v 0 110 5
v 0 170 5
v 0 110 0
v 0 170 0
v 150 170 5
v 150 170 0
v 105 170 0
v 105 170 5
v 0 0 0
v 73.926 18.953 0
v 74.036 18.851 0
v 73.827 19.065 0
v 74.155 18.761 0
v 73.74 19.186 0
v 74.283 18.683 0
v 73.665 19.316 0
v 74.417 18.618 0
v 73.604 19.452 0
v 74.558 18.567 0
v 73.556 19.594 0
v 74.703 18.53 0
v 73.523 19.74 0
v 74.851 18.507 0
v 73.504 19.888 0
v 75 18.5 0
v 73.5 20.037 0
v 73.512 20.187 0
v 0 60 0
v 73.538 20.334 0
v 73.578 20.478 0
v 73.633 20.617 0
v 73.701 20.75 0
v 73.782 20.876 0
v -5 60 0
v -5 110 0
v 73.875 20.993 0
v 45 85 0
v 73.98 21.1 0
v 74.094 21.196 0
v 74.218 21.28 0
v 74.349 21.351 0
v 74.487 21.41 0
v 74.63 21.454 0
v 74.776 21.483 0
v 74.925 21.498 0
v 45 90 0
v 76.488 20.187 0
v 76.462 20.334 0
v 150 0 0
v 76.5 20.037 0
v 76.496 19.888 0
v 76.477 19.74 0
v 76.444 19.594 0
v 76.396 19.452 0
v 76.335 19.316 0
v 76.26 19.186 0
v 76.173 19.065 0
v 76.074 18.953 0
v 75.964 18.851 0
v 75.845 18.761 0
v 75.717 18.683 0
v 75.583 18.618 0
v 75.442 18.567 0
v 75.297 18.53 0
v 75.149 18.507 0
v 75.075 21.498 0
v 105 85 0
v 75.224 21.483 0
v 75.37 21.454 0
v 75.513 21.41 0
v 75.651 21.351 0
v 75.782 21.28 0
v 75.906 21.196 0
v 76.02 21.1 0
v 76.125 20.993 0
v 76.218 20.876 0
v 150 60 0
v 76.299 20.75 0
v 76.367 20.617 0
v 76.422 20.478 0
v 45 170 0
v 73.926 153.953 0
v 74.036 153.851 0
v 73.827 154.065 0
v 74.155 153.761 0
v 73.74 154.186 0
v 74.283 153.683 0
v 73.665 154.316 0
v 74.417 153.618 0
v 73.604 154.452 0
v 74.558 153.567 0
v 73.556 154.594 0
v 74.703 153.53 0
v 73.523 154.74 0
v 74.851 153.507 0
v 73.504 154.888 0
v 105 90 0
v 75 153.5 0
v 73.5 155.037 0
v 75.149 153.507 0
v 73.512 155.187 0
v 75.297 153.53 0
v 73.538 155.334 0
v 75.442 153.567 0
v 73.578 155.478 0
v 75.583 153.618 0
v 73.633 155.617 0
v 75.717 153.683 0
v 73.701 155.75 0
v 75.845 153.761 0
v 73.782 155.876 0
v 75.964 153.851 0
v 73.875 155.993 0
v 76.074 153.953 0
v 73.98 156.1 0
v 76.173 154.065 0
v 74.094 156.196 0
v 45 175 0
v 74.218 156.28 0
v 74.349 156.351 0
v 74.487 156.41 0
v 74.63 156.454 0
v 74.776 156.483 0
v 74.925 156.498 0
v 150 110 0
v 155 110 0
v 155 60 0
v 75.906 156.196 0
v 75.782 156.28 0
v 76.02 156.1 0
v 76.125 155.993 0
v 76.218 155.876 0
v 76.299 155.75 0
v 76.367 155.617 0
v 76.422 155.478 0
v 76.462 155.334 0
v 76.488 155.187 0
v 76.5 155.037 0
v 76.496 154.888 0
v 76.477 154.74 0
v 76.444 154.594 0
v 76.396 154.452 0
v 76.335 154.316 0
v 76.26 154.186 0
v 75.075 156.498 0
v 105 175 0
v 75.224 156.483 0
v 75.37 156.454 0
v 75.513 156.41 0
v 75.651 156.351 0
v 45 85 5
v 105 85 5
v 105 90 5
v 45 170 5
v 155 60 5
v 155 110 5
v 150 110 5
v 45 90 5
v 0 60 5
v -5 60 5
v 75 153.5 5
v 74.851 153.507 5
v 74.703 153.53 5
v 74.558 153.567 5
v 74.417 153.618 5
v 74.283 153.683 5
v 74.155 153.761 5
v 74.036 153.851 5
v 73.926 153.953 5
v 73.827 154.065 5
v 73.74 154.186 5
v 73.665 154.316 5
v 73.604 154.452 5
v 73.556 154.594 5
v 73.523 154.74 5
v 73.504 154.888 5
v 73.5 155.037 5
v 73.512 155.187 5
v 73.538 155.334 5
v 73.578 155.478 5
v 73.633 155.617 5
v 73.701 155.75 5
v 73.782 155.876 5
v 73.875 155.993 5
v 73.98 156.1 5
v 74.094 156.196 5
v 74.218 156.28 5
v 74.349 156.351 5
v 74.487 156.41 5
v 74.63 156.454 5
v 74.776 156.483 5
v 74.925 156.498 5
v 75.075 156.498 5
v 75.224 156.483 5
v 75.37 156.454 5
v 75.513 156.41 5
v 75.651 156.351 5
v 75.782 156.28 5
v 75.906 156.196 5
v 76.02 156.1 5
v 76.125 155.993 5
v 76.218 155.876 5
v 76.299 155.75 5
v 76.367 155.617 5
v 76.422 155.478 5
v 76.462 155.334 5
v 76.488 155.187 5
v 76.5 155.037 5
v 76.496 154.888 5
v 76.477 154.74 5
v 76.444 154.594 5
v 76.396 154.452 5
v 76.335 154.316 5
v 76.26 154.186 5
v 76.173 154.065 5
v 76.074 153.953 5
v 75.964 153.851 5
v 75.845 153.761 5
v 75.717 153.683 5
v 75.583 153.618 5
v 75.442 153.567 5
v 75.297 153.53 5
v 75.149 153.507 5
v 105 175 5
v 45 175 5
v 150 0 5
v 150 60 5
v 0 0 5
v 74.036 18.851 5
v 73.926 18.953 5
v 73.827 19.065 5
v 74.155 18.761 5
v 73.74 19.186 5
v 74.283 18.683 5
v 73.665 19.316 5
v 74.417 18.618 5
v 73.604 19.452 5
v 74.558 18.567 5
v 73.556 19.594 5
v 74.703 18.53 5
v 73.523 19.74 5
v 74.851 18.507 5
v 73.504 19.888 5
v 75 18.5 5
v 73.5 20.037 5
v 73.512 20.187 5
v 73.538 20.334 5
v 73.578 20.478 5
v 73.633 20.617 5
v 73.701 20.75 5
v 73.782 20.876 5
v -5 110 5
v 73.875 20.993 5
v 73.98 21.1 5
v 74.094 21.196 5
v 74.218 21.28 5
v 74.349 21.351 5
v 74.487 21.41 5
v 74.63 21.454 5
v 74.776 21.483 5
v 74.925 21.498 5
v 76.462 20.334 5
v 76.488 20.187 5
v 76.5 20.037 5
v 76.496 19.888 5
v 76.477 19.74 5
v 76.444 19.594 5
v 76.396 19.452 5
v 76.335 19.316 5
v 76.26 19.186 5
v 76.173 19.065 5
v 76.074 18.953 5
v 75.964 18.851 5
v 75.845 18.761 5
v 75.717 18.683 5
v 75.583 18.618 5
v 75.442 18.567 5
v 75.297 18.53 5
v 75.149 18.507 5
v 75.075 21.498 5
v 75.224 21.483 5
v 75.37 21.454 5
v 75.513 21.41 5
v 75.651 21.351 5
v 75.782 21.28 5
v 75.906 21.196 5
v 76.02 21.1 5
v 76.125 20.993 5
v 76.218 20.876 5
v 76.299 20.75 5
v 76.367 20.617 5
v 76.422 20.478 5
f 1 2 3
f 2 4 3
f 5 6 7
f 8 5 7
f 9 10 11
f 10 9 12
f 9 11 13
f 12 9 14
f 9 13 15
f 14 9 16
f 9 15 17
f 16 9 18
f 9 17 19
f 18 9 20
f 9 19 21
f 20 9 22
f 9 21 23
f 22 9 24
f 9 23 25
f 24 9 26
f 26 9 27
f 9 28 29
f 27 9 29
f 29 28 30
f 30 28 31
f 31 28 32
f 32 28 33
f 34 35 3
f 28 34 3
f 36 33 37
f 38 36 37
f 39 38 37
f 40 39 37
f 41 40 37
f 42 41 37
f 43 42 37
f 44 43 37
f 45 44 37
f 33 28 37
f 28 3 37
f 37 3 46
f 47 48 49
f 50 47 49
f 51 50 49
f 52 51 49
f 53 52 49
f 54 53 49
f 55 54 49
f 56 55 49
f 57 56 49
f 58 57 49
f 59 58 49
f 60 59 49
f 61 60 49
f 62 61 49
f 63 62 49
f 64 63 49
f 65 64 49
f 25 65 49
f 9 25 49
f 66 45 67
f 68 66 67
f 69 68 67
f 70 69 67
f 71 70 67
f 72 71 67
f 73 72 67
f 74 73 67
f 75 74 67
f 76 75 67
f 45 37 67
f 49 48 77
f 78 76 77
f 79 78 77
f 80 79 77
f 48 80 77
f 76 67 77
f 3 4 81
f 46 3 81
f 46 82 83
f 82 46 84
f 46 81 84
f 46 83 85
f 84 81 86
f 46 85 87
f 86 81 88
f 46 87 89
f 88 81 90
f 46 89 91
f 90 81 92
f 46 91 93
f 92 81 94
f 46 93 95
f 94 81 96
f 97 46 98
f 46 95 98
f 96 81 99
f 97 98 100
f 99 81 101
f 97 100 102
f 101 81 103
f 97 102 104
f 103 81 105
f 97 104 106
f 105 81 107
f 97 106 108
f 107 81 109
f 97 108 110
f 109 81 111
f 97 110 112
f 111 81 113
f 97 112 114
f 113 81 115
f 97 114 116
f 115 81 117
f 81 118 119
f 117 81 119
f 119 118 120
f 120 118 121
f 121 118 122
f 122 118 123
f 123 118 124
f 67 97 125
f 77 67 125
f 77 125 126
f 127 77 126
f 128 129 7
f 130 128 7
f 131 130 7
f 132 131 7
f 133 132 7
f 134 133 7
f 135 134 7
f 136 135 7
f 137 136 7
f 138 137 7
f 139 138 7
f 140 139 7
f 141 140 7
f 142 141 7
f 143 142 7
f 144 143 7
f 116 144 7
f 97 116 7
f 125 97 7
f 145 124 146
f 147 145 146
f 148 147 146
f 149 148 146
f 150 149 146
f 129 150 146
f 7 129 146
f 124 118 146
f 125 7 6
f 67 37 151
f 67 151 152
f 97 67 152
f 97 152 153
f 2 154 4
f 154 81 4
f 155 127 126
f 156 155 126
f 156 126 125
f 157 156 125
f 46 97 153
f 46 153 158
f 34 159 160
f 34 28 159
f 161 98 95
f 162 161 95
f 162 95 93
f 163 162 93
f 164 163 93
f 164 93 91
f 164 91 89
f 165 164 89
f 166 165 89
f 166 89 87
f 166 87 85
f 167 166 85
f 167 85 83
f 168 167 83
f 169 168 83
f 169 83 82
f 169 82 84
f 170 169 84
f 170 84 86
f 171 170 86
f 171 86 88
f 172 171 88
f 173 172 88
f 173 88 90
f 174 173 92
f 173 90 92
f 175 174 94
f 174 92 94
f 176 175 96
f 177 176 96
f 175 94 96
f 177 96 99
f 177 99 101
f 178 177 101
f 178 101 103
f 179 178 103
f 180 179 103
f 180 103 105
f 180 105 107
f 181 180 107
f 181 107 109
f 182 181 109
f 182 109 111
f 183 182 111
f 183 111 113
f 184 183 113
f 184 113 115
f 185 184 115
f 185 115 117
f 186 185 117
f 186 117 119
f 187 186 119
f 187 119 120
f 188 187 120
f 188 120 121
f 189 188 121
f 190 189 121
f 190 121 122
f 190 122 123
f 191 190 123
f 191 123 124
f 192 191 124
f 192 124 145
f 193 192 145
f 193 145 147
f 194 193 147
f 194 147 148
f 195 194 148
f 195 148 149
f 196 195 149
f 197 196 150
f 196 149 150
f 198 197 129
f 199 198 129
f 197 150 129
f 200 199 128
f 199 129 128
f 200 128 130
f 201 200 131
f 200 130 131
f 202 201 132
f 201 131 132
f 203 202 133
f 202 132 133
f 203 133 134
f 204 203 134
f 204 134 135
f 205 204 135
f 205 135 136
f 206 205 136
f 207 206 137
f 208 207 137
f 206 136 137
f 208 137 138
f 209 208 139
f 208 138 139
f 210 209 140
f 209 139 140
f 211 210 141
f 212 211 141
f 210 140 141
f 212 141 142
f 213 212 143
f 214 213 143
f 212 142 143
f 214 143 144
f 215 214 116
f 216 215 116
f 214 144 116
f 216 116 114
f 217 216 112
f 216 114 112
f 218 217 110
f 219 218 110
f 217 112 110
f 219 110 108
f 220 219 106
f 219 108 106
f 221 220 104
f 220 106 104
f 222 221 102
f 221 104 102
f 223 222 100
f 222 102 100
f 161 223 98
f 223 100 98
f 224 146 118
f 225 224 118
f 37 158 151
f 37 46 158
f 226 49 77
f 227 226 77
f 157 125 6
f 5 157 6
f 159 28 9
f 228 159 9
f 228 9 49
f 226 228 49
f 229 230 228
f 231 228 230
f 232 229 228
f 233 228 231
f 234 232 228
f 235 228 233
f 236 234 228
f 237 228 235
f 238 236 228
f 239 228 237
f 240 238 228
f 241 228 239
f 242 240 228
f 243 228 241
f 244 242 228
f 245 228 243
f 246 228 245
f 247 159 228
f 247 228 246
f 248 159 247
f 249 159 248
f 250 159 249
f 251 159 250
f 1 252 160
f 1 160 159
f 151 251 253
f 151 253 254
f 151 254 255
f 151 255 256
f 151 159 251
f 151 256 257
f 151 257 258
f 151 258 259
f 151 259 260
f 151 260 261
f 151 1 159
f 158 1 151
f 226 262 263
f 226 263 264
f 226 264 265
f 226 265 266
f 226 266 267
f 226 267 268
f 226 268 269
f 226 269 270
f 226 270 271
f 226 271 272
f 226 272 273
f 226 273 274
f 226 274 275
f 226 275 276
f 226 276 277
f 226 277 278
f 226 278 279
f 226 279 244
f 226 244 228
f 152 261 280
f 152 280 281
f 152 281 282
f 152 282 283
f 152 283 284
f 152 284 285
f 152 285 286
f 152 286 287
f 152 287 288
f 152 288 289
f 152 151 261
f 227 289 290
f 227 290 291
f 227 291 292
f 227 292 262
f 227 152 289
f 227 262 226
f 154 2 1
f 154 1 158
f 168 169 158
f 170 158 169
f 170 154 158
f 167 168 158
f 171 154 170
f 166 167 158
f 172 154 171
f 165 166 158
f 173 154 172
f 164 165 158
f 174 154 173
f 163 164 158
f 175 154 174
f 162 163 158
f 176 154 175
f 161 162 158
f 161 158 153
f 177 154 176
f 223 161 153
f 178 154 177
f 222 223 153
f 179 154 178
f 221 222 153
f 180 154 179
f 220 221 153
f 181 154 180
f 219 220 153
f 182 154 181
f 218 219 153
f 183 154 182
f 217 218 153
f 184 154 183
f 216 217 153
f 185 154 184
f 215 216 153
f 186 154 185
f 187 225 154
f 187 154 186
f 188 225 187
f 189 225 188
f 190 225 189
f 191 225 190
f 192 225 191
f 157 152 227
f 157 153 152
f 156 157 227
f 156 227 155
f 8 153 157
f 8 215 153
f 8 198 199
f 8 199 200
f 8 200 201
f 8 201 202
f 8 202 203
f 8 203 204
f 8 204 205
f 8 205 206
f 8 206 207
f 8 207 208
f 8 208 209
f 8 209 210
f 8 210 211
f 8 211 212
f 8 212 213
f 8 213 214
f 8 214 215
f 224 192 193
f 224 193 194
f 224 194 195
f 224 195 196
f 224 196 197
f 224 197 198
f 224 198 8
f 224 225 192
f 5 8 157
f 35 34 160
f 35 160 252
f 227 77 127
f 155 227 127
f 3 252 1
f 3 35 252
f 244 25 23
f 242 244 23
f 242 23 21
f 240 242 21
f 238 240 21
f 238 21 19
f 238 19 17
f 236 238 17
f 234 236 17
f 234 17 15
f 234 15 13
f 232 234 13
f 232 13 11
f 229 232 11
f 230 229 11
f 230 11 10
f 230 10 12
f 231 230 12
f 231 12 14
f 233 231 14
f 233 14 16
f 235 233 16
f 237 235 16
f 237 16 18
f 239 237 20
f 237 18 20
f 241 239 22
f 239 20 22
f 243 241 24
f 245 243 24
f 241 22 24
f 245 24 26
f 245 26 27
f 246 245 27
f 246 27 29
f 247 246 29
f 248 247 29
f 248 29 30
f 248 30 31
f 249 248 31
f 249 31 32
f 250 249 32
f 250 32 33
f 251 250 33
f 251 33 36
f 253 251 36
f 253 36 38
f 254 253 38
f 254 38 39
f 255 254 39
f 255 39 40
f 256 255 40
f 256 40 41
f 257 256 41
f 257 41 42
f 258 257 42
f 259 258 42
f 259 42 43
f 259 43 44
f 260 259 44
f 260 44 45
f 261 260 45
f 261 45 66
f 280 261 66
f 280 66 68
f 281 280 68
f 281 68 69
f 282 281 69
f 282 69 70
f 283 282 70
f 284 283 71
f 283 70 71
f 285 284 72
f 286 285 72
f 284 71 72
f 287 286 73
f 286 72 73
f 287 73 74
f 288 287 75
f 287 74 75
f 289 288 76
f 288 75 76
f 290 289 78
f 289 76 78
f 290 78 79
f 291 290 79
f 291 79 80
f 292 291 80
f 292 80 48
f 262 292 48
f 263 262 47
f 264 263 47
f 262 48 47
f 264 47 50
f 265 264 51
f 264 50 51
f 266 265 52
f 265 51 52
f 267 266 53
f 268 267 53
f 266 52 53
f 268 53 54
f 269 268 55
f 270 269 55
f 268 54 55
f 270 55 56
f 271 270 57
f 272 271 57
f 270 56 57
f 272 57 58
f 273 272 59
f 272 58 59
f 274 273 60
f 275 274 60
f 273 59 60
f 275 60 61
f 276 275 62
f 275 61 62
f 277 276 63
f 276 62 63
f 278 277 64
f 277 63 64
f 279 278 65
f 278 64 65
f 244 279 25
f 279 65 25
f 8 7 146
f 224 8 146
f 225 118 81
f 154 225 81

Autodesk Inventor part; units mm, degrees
ref_plane "YZ Plane" through (0, 0, 0) normal (1, 0, 0) x (0, 1, 0)
ref_plane "XZ Plane" through (0, 0, 0) normal (0, 1, 0) x (-1, 0, 0)
ref_plane "XY Plane" through (0, 0, 0) normal (0, 0, 1) x (1, 0, 0)
sketch "Sketch1" plane through (0, 0, 0) normal (0, 0, 1) x (1, 0, 0)
  line L0 (0, 0) -> (150, 0)
  line L1 (150, 0) -> (150, 170)
  line L2 (150, 170) -> (0, 170)
  line L3 (0, 170) -> (0, 0)
  line L4 (0, 60) -> (-5, 60)
  line L5 (-5, 60) -> (-5, 110)
  line L6 (-5, 110) -> (0, 110)
  line L7 (0, 110) -> (0, 60)
  line L8 (75, 0) -> (75, 170) construction
  line L9 (150, 60) -> (155, 60)
  line L10 (155, 60) -> (155, 110)
  line L11 (155, 110) -> (150, 110)
  line L12 (150, 110) -> (150, 60)
  line L13 (45, 85) -> (105, 85)
  line L14 (105, 85) -> (105, 90)
  line L15 (105, 90) -> (45, 90)
  line L16 (45, 90) -> (45, 85)
  line L17 (0, 85) -> (150, 85) construction
  line L18 (45, 170) -> (105, 170)
  line L19 (105, 170) -> (105, 175)
  line L20 (105, 175) -> (45, 175)
  line L21 (45, 175) -> (45, 170)
  point P0 (0, 110)
  point P1 (10, 0)
  point P2 (45, 87.5)
  dimension "d0" = 150
  dimension "d1" = 170
  dimension "d2" = 5
  dimension "d3" = 50
  dimension "d6" = 60
  dimension "d7" = 5
  dimension "d13" = 80
  dimension "d14" = 30
  dimension "d30" = 60
  dimension "d31" = 5
  dimension "d32" = 45
  dimension "d44" = 60
extrude "Extrusion1" add sketch "Sketch1" along normal blind 5
sketch "Sketch2" plane through (0, 0, 5) normal (0, 0, 1) x (1, 0, 0)
  line L0 (150, 170) -> (0, 170) projected
  line L1 (0, 0) -> (150, 0) projected
  line L2 (0, 170) -> (0, 110) projected
  line L3 (0, 60) -> (0, 0) projected
  point P0 (75, 20)
  dimension "d24" = 20
  dimension "d29" = 75
hole "Hole1" at (75, 20, 5) direction (0, 0, -1) diameter 3 end through all
sketch "Sketch3" plane through (0, 0, 5) normal (0, 0, 1) x (1, 0, 0)
  line L0 (105, 175) -> (45, 175) projected
  line L1 (45, 175) -> (45, 170) projected
  line L2 (0, 170) -> (0, 110) projected
  point P0 (0, 0)
  point P1 (75, 155)
  dimension "d40" = 20
  dimension "d45" = 75
hole "Hole2" at (75, 155, 5) direction (0, 0, -1) diameter 3 end through all
properties part number "back"
